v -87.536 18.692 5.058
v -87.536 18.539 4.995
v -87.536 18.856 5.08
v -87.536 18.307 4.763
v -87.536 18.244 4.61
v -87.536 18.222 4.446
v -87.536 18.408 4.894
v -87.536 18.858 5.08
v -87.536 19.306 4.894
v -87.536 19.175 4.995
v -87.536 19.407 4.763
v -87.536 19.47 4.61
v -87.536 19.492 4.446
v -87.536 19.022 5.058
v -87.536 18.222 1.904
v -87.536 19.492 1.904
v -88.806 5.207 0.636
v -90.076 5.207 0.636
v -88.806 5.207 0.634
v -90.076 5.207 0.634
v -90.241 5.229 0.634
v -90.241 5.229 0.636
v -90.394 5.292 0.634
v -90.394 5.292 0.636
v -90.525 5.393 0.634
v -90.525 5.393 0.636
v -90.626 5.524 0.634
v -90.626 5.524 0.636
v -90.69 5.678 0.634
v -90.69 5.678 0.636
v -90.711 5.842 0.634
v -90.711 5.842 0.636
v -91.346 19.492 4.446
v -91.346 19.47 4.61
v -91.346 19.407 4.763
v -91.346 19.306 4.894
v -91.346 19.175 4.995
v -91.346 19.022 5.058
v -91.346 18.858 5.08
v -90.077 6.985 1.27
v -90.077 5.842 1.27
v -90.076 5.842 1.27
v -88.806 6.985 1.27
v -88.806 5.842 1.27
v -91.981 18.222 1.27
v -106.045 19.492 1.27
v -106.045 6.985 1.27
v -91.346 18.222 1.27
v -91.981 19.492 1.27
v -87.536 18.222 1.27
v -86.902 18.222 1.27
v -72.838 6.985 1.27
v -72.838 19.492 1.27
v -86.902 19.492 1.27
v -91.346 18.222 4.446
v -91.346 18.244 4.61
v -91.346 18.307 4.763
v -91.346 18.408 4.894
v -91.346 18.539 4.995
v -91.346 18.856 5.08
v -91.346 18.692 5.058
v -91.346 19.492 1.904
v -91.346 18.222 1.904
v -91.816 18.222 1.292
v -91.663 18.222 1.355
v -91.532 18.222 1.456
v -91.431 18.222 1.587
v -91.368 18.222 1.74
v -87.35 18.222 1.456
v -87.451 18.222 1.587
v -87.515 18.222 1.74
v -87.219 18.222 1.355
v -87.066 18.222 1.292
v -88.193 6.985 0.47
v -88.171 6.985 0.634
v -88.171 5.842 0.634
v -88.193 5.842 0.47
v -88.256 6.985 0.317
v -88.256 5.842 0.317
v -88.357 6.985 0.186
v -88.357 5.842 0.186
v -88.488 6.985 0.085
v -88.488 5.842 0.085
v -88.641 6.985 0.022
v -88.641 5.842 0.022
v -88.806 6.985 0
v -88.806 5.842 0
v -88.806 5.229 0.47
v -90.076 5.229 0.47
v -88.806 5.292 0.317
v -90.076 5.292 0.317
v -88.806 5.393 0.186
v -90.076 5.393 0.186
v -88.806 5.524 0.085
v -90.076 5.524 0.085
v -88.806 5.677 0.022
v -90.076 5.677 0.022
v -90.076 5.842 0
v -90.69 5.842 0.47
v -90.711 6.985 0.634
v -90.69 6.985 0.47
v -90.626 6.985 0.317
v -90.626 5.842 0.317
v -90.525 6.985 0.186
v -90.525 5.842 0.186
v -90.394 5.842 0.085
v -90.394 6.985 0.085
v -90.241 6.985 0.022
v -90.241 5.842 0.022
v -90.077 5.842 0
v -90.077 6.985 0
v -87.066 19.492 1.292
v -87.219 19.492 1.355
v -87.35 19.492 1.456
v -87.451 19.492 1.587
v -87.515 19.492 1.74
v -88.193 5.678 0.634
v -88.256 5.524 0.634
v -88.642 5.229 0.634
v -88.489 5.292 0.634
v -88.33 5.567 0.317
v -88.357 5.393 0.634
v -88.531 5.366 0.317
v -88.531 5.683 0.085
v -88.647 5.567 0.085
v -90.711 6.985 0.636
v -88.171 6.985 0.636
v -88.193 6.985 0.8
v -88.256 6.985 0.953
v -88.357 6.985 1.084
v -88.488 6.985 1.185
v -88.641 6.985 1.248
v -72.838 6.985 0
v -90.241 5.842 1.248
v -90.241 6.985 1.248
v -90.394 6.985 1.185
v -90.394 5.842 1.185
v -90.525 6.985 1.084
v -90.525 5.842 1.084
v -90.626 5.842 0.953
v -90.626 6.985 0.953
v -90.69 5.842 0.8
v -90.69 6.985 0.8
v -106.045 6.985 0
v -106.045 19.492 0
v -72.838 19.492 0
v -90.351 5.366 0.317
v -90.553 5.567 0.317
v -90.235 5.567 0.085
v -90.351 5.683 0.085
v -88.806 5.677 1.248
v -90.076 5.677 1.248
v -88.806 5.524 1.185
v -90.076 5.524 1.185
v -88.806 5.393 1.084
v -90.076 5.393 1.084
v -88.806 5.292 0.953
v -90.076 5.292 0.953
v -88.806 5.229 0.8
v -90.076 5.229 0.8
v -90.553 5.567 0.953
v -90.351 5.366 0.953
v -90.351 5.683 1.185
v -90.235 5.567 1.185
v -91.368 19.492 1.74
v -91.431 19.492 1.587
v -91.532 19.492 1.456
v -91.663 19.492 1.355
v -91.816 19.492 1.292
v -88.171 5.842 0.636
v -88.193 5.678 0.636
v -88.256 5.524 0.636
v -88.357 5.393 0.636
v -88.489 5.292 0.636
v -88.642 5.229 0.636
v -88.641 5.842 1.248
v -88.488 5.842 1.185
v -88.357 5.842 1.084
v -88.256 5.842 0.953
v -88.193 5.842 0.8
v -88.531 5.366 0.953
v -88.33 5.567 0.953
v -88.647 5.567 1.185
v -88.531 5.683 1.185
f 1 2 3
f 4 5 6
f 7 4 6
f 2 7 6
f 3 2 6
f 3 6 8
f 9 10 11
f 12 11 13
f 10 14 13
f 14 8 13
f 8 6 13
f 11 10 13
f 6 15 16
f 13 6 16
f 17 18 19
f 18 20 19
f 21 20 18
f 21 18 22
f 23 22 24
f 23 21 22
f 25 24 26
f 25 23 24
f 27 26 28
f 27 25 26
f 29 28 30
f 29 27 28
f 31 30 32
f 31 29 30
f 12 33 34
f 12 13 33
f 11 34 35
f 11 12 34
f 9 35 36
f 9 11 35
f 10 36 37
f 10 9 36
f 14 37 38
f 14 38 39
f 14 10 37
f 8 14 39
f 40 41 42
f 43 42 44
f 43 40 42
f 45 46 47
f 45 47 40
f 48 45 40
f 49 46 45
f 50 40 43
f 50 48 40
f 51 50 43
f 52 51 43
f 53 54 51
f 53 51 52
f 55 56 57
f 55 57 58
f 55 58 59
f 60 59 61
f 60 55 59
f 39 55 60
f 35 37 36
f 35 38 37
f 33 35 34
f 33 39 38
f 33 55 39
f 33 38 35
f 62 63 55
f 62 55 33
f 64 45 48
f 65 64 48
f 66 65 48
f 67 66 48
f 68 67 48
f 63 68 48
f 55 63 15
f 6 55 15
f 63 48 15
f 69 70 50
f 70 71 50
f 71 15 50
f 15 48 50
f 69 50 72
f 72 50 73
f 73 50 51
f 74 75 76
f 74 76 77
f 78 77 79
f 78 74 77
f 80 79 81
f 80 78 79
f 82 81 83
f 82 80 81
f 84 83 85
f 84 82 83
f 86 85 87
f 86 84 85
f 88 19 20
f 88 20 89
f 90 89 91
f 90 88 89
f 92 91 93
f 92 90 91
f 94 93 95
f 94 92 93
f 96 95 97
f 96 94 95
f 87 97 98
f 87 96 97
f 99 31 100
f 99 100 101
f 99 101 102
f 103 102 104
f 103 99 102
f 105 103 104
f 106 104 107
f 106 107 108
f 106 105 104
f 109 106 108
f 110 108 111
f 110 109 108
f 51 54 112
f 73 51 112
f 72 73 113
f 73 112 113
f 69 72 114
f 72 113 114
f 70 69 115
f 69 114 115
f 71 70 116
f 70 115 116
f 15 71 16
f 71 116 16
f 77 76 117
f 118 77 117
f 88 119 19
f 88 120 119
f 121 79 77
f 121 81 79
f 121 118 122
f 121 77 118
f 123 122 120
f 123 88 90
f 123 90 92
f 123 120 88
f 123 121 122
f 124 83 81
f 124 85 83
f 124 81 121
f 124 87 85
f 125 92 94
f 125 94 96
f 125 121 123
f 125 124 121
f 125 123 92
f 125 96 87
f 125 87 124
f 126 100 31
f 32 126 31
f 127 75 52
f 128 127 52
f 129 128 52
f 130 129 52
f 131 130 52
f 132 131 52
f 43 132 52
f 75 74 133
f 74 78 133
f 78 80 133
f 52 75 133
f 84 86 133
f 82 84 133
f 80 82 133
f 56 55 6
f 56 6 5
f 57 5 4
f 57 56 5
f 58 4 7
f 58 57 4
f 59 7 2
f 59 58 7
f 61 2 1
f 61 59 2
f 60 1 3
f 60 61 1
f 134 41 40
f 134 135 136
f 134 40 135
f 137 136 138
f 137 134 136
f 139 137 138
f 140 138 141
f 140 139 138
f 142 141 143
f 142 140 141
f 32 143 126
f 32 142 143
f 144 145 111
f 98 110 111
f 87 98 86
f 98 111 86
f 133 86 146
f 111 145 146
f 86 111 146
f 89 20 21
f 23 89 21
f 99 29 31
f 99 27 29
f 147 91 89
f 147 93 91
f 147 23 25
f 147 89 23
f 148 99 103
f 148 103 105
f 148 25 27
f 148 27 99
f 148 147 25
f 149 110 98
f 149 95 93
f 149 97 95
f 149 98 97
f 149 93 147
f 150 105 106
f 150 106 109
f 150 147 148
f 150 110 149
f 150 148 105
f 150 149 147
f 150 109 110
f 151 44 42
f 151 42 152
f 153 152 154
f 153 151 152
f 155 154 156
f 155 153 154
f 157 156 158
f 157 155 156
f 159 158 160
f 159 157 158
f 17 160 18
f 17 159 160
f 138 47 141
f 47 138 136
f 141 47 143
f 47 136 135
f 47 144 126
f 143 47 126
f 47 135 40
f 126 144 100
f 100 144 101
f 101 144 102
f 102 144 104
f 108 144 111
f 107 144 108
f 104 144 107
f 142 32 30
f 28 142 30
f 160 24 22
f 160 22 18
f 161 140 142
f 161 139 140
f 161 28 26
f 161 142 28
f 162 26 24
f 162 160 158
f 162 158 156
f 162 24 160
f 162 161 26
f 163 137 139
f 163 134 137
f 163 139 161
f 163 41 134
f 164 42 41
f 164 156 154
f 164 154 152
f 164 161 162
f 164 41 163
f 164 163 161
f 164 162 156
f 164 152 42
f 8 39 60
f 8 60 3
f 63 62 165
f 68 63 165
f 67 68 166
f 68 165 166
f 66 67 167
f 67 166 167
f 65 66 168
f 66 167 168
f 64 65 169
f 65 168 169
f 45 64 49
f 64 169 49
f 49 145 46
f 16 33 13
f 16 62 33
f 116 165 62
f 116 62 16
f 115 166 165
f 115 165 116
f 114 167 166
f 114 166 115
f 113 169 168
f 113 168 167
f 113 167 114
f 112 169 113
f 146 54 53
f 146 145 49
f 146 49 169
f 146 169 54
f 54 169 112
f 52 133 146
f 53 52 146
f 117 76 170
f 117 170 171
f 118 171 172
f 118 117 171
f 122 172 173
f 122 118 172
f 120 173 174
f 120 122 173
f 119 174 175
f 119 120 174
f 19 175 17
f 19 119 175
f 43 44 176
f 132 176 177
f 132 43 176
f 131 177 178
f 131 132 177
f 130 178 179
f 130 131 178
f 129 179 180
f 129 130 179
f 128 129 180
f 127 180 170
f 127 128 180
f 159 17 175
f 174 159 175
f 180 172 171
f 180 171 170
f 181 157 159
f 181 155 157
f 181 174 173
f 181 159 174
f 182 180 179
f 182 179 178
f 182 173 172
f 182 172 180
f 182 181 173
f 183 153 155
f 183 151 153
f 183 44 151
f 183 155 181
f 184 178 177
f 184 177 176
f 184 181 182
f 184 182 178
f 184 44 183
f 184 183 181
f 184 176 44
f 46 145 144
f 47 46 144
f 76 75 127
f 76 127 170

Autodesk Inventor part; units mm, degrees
ref_plane "YZ Plane" through (0, 0, 0) normal (1, 0, 0) x (0, 1, 0)
ref_plane "XZ Plane" through (0, 0, 0) normal (0, 1, 0) x (-1, 0, 0)
ref_plane "XY Plane" through (0, 0, 0) normal (0, 0, 1) x (1, 0, 0)
sketch "Sketch1" plane through (0, 0, 0) normal (0, 0, 1) x (1, 0, 0)
  line L0 (-106.045, 6.985) -> (-90.7112, 6.985) projected
  line L1 (-88.1712, 6.985) -> (-72.8375, 6.985) projected
  line L2 (-72.8375, 6.985) -> (-72.8375, 19.492) projected
  line L3 (-106.045, 19.492) -> (-106.045, 6.985) projected
  line L4 (-106.045, 19.492) -> (-72.8375, 19.492)
  line L5 (-90.0762, 5.207) -> (-88.8062, 5.207)
  line L6 (-88.1712, 6.985) -> (-88.1712, 5.842)
  line L7 (-90.7112, 6.985) -> (-90.7112, 5.842)
  arc A0 (-90.7112, 5.842) -> (-90.0762, 5.207) centre (-90.0762, 5.842) ccw
  arc A1 (-88.8062, 5.207) -> (-88.1712, 5.842) centre (-88.8062, 5.842) ccw
  point P0 (0, 0)
  dimension "d0" = 0.635
extrude "Extrusion1" add sketch "Sketch1" along normal blind 1.27
fillet "Fillet1" radius 0.635 10 edges at (-88.3572, 5.393, 0) (-89.4412, 5.207, 0) (-90.5253, 5.393, 0) (-90.7112, 6.4135, 0) (-88.1712, 6.4135, 0) (-88.3572, 5.393, 1.27) (-89.4412, 5.207, 1.27) (-90.5253, 5.393, 1.27) (-90.7112, 6.4135, 1.27) (-88.1712, 6.4135, 1.27)
sketch "Sketch2" plane through (0, 0, 1.27) normal (0, 0, 1) x (1, 0, 0)
  line L0 (-72.8375, 19.492) -> (-106.045, 19.492) projected
  line L1 (-72.8375, 19.492) -> (-106.045, 19.492) projected
  line L2 (-89.4412, 19.492) -> (-89.4412, 18.222)
  line L3 (-89.4412, 18.222) -> (-91.3462, 18.222)
  line L4 (-91.3462, 18.222) -> (-91.3462, 19.492)
  line L5 (-89.4412, 18.222) -> (-87.5362, 18.222)
  line L6 (-87.5362, 18.222) -> (-87.5362, 19.492)
  line L7 (-91.3462, 19.492) -> (-87.5362, 19.492)
  point P0 (0, 0)
  dimension "d4" = 1.27
  dimension "d5" = 1.905
  dimension "d6" = 1.905
extrude "Extrusion2" add sketch "Sketch2" along normal blind 3.81
fillet "Fillet2" radius 0.635 4 edges at (-89.4412, 19.492, 5.08) (-89.4412, 18.222, 5.08) (-87.5362, 18.857, 1.27) (-91.3462, 18.857, 1.27)
properties part number "FloppyCover" material "UHMW, Black"
